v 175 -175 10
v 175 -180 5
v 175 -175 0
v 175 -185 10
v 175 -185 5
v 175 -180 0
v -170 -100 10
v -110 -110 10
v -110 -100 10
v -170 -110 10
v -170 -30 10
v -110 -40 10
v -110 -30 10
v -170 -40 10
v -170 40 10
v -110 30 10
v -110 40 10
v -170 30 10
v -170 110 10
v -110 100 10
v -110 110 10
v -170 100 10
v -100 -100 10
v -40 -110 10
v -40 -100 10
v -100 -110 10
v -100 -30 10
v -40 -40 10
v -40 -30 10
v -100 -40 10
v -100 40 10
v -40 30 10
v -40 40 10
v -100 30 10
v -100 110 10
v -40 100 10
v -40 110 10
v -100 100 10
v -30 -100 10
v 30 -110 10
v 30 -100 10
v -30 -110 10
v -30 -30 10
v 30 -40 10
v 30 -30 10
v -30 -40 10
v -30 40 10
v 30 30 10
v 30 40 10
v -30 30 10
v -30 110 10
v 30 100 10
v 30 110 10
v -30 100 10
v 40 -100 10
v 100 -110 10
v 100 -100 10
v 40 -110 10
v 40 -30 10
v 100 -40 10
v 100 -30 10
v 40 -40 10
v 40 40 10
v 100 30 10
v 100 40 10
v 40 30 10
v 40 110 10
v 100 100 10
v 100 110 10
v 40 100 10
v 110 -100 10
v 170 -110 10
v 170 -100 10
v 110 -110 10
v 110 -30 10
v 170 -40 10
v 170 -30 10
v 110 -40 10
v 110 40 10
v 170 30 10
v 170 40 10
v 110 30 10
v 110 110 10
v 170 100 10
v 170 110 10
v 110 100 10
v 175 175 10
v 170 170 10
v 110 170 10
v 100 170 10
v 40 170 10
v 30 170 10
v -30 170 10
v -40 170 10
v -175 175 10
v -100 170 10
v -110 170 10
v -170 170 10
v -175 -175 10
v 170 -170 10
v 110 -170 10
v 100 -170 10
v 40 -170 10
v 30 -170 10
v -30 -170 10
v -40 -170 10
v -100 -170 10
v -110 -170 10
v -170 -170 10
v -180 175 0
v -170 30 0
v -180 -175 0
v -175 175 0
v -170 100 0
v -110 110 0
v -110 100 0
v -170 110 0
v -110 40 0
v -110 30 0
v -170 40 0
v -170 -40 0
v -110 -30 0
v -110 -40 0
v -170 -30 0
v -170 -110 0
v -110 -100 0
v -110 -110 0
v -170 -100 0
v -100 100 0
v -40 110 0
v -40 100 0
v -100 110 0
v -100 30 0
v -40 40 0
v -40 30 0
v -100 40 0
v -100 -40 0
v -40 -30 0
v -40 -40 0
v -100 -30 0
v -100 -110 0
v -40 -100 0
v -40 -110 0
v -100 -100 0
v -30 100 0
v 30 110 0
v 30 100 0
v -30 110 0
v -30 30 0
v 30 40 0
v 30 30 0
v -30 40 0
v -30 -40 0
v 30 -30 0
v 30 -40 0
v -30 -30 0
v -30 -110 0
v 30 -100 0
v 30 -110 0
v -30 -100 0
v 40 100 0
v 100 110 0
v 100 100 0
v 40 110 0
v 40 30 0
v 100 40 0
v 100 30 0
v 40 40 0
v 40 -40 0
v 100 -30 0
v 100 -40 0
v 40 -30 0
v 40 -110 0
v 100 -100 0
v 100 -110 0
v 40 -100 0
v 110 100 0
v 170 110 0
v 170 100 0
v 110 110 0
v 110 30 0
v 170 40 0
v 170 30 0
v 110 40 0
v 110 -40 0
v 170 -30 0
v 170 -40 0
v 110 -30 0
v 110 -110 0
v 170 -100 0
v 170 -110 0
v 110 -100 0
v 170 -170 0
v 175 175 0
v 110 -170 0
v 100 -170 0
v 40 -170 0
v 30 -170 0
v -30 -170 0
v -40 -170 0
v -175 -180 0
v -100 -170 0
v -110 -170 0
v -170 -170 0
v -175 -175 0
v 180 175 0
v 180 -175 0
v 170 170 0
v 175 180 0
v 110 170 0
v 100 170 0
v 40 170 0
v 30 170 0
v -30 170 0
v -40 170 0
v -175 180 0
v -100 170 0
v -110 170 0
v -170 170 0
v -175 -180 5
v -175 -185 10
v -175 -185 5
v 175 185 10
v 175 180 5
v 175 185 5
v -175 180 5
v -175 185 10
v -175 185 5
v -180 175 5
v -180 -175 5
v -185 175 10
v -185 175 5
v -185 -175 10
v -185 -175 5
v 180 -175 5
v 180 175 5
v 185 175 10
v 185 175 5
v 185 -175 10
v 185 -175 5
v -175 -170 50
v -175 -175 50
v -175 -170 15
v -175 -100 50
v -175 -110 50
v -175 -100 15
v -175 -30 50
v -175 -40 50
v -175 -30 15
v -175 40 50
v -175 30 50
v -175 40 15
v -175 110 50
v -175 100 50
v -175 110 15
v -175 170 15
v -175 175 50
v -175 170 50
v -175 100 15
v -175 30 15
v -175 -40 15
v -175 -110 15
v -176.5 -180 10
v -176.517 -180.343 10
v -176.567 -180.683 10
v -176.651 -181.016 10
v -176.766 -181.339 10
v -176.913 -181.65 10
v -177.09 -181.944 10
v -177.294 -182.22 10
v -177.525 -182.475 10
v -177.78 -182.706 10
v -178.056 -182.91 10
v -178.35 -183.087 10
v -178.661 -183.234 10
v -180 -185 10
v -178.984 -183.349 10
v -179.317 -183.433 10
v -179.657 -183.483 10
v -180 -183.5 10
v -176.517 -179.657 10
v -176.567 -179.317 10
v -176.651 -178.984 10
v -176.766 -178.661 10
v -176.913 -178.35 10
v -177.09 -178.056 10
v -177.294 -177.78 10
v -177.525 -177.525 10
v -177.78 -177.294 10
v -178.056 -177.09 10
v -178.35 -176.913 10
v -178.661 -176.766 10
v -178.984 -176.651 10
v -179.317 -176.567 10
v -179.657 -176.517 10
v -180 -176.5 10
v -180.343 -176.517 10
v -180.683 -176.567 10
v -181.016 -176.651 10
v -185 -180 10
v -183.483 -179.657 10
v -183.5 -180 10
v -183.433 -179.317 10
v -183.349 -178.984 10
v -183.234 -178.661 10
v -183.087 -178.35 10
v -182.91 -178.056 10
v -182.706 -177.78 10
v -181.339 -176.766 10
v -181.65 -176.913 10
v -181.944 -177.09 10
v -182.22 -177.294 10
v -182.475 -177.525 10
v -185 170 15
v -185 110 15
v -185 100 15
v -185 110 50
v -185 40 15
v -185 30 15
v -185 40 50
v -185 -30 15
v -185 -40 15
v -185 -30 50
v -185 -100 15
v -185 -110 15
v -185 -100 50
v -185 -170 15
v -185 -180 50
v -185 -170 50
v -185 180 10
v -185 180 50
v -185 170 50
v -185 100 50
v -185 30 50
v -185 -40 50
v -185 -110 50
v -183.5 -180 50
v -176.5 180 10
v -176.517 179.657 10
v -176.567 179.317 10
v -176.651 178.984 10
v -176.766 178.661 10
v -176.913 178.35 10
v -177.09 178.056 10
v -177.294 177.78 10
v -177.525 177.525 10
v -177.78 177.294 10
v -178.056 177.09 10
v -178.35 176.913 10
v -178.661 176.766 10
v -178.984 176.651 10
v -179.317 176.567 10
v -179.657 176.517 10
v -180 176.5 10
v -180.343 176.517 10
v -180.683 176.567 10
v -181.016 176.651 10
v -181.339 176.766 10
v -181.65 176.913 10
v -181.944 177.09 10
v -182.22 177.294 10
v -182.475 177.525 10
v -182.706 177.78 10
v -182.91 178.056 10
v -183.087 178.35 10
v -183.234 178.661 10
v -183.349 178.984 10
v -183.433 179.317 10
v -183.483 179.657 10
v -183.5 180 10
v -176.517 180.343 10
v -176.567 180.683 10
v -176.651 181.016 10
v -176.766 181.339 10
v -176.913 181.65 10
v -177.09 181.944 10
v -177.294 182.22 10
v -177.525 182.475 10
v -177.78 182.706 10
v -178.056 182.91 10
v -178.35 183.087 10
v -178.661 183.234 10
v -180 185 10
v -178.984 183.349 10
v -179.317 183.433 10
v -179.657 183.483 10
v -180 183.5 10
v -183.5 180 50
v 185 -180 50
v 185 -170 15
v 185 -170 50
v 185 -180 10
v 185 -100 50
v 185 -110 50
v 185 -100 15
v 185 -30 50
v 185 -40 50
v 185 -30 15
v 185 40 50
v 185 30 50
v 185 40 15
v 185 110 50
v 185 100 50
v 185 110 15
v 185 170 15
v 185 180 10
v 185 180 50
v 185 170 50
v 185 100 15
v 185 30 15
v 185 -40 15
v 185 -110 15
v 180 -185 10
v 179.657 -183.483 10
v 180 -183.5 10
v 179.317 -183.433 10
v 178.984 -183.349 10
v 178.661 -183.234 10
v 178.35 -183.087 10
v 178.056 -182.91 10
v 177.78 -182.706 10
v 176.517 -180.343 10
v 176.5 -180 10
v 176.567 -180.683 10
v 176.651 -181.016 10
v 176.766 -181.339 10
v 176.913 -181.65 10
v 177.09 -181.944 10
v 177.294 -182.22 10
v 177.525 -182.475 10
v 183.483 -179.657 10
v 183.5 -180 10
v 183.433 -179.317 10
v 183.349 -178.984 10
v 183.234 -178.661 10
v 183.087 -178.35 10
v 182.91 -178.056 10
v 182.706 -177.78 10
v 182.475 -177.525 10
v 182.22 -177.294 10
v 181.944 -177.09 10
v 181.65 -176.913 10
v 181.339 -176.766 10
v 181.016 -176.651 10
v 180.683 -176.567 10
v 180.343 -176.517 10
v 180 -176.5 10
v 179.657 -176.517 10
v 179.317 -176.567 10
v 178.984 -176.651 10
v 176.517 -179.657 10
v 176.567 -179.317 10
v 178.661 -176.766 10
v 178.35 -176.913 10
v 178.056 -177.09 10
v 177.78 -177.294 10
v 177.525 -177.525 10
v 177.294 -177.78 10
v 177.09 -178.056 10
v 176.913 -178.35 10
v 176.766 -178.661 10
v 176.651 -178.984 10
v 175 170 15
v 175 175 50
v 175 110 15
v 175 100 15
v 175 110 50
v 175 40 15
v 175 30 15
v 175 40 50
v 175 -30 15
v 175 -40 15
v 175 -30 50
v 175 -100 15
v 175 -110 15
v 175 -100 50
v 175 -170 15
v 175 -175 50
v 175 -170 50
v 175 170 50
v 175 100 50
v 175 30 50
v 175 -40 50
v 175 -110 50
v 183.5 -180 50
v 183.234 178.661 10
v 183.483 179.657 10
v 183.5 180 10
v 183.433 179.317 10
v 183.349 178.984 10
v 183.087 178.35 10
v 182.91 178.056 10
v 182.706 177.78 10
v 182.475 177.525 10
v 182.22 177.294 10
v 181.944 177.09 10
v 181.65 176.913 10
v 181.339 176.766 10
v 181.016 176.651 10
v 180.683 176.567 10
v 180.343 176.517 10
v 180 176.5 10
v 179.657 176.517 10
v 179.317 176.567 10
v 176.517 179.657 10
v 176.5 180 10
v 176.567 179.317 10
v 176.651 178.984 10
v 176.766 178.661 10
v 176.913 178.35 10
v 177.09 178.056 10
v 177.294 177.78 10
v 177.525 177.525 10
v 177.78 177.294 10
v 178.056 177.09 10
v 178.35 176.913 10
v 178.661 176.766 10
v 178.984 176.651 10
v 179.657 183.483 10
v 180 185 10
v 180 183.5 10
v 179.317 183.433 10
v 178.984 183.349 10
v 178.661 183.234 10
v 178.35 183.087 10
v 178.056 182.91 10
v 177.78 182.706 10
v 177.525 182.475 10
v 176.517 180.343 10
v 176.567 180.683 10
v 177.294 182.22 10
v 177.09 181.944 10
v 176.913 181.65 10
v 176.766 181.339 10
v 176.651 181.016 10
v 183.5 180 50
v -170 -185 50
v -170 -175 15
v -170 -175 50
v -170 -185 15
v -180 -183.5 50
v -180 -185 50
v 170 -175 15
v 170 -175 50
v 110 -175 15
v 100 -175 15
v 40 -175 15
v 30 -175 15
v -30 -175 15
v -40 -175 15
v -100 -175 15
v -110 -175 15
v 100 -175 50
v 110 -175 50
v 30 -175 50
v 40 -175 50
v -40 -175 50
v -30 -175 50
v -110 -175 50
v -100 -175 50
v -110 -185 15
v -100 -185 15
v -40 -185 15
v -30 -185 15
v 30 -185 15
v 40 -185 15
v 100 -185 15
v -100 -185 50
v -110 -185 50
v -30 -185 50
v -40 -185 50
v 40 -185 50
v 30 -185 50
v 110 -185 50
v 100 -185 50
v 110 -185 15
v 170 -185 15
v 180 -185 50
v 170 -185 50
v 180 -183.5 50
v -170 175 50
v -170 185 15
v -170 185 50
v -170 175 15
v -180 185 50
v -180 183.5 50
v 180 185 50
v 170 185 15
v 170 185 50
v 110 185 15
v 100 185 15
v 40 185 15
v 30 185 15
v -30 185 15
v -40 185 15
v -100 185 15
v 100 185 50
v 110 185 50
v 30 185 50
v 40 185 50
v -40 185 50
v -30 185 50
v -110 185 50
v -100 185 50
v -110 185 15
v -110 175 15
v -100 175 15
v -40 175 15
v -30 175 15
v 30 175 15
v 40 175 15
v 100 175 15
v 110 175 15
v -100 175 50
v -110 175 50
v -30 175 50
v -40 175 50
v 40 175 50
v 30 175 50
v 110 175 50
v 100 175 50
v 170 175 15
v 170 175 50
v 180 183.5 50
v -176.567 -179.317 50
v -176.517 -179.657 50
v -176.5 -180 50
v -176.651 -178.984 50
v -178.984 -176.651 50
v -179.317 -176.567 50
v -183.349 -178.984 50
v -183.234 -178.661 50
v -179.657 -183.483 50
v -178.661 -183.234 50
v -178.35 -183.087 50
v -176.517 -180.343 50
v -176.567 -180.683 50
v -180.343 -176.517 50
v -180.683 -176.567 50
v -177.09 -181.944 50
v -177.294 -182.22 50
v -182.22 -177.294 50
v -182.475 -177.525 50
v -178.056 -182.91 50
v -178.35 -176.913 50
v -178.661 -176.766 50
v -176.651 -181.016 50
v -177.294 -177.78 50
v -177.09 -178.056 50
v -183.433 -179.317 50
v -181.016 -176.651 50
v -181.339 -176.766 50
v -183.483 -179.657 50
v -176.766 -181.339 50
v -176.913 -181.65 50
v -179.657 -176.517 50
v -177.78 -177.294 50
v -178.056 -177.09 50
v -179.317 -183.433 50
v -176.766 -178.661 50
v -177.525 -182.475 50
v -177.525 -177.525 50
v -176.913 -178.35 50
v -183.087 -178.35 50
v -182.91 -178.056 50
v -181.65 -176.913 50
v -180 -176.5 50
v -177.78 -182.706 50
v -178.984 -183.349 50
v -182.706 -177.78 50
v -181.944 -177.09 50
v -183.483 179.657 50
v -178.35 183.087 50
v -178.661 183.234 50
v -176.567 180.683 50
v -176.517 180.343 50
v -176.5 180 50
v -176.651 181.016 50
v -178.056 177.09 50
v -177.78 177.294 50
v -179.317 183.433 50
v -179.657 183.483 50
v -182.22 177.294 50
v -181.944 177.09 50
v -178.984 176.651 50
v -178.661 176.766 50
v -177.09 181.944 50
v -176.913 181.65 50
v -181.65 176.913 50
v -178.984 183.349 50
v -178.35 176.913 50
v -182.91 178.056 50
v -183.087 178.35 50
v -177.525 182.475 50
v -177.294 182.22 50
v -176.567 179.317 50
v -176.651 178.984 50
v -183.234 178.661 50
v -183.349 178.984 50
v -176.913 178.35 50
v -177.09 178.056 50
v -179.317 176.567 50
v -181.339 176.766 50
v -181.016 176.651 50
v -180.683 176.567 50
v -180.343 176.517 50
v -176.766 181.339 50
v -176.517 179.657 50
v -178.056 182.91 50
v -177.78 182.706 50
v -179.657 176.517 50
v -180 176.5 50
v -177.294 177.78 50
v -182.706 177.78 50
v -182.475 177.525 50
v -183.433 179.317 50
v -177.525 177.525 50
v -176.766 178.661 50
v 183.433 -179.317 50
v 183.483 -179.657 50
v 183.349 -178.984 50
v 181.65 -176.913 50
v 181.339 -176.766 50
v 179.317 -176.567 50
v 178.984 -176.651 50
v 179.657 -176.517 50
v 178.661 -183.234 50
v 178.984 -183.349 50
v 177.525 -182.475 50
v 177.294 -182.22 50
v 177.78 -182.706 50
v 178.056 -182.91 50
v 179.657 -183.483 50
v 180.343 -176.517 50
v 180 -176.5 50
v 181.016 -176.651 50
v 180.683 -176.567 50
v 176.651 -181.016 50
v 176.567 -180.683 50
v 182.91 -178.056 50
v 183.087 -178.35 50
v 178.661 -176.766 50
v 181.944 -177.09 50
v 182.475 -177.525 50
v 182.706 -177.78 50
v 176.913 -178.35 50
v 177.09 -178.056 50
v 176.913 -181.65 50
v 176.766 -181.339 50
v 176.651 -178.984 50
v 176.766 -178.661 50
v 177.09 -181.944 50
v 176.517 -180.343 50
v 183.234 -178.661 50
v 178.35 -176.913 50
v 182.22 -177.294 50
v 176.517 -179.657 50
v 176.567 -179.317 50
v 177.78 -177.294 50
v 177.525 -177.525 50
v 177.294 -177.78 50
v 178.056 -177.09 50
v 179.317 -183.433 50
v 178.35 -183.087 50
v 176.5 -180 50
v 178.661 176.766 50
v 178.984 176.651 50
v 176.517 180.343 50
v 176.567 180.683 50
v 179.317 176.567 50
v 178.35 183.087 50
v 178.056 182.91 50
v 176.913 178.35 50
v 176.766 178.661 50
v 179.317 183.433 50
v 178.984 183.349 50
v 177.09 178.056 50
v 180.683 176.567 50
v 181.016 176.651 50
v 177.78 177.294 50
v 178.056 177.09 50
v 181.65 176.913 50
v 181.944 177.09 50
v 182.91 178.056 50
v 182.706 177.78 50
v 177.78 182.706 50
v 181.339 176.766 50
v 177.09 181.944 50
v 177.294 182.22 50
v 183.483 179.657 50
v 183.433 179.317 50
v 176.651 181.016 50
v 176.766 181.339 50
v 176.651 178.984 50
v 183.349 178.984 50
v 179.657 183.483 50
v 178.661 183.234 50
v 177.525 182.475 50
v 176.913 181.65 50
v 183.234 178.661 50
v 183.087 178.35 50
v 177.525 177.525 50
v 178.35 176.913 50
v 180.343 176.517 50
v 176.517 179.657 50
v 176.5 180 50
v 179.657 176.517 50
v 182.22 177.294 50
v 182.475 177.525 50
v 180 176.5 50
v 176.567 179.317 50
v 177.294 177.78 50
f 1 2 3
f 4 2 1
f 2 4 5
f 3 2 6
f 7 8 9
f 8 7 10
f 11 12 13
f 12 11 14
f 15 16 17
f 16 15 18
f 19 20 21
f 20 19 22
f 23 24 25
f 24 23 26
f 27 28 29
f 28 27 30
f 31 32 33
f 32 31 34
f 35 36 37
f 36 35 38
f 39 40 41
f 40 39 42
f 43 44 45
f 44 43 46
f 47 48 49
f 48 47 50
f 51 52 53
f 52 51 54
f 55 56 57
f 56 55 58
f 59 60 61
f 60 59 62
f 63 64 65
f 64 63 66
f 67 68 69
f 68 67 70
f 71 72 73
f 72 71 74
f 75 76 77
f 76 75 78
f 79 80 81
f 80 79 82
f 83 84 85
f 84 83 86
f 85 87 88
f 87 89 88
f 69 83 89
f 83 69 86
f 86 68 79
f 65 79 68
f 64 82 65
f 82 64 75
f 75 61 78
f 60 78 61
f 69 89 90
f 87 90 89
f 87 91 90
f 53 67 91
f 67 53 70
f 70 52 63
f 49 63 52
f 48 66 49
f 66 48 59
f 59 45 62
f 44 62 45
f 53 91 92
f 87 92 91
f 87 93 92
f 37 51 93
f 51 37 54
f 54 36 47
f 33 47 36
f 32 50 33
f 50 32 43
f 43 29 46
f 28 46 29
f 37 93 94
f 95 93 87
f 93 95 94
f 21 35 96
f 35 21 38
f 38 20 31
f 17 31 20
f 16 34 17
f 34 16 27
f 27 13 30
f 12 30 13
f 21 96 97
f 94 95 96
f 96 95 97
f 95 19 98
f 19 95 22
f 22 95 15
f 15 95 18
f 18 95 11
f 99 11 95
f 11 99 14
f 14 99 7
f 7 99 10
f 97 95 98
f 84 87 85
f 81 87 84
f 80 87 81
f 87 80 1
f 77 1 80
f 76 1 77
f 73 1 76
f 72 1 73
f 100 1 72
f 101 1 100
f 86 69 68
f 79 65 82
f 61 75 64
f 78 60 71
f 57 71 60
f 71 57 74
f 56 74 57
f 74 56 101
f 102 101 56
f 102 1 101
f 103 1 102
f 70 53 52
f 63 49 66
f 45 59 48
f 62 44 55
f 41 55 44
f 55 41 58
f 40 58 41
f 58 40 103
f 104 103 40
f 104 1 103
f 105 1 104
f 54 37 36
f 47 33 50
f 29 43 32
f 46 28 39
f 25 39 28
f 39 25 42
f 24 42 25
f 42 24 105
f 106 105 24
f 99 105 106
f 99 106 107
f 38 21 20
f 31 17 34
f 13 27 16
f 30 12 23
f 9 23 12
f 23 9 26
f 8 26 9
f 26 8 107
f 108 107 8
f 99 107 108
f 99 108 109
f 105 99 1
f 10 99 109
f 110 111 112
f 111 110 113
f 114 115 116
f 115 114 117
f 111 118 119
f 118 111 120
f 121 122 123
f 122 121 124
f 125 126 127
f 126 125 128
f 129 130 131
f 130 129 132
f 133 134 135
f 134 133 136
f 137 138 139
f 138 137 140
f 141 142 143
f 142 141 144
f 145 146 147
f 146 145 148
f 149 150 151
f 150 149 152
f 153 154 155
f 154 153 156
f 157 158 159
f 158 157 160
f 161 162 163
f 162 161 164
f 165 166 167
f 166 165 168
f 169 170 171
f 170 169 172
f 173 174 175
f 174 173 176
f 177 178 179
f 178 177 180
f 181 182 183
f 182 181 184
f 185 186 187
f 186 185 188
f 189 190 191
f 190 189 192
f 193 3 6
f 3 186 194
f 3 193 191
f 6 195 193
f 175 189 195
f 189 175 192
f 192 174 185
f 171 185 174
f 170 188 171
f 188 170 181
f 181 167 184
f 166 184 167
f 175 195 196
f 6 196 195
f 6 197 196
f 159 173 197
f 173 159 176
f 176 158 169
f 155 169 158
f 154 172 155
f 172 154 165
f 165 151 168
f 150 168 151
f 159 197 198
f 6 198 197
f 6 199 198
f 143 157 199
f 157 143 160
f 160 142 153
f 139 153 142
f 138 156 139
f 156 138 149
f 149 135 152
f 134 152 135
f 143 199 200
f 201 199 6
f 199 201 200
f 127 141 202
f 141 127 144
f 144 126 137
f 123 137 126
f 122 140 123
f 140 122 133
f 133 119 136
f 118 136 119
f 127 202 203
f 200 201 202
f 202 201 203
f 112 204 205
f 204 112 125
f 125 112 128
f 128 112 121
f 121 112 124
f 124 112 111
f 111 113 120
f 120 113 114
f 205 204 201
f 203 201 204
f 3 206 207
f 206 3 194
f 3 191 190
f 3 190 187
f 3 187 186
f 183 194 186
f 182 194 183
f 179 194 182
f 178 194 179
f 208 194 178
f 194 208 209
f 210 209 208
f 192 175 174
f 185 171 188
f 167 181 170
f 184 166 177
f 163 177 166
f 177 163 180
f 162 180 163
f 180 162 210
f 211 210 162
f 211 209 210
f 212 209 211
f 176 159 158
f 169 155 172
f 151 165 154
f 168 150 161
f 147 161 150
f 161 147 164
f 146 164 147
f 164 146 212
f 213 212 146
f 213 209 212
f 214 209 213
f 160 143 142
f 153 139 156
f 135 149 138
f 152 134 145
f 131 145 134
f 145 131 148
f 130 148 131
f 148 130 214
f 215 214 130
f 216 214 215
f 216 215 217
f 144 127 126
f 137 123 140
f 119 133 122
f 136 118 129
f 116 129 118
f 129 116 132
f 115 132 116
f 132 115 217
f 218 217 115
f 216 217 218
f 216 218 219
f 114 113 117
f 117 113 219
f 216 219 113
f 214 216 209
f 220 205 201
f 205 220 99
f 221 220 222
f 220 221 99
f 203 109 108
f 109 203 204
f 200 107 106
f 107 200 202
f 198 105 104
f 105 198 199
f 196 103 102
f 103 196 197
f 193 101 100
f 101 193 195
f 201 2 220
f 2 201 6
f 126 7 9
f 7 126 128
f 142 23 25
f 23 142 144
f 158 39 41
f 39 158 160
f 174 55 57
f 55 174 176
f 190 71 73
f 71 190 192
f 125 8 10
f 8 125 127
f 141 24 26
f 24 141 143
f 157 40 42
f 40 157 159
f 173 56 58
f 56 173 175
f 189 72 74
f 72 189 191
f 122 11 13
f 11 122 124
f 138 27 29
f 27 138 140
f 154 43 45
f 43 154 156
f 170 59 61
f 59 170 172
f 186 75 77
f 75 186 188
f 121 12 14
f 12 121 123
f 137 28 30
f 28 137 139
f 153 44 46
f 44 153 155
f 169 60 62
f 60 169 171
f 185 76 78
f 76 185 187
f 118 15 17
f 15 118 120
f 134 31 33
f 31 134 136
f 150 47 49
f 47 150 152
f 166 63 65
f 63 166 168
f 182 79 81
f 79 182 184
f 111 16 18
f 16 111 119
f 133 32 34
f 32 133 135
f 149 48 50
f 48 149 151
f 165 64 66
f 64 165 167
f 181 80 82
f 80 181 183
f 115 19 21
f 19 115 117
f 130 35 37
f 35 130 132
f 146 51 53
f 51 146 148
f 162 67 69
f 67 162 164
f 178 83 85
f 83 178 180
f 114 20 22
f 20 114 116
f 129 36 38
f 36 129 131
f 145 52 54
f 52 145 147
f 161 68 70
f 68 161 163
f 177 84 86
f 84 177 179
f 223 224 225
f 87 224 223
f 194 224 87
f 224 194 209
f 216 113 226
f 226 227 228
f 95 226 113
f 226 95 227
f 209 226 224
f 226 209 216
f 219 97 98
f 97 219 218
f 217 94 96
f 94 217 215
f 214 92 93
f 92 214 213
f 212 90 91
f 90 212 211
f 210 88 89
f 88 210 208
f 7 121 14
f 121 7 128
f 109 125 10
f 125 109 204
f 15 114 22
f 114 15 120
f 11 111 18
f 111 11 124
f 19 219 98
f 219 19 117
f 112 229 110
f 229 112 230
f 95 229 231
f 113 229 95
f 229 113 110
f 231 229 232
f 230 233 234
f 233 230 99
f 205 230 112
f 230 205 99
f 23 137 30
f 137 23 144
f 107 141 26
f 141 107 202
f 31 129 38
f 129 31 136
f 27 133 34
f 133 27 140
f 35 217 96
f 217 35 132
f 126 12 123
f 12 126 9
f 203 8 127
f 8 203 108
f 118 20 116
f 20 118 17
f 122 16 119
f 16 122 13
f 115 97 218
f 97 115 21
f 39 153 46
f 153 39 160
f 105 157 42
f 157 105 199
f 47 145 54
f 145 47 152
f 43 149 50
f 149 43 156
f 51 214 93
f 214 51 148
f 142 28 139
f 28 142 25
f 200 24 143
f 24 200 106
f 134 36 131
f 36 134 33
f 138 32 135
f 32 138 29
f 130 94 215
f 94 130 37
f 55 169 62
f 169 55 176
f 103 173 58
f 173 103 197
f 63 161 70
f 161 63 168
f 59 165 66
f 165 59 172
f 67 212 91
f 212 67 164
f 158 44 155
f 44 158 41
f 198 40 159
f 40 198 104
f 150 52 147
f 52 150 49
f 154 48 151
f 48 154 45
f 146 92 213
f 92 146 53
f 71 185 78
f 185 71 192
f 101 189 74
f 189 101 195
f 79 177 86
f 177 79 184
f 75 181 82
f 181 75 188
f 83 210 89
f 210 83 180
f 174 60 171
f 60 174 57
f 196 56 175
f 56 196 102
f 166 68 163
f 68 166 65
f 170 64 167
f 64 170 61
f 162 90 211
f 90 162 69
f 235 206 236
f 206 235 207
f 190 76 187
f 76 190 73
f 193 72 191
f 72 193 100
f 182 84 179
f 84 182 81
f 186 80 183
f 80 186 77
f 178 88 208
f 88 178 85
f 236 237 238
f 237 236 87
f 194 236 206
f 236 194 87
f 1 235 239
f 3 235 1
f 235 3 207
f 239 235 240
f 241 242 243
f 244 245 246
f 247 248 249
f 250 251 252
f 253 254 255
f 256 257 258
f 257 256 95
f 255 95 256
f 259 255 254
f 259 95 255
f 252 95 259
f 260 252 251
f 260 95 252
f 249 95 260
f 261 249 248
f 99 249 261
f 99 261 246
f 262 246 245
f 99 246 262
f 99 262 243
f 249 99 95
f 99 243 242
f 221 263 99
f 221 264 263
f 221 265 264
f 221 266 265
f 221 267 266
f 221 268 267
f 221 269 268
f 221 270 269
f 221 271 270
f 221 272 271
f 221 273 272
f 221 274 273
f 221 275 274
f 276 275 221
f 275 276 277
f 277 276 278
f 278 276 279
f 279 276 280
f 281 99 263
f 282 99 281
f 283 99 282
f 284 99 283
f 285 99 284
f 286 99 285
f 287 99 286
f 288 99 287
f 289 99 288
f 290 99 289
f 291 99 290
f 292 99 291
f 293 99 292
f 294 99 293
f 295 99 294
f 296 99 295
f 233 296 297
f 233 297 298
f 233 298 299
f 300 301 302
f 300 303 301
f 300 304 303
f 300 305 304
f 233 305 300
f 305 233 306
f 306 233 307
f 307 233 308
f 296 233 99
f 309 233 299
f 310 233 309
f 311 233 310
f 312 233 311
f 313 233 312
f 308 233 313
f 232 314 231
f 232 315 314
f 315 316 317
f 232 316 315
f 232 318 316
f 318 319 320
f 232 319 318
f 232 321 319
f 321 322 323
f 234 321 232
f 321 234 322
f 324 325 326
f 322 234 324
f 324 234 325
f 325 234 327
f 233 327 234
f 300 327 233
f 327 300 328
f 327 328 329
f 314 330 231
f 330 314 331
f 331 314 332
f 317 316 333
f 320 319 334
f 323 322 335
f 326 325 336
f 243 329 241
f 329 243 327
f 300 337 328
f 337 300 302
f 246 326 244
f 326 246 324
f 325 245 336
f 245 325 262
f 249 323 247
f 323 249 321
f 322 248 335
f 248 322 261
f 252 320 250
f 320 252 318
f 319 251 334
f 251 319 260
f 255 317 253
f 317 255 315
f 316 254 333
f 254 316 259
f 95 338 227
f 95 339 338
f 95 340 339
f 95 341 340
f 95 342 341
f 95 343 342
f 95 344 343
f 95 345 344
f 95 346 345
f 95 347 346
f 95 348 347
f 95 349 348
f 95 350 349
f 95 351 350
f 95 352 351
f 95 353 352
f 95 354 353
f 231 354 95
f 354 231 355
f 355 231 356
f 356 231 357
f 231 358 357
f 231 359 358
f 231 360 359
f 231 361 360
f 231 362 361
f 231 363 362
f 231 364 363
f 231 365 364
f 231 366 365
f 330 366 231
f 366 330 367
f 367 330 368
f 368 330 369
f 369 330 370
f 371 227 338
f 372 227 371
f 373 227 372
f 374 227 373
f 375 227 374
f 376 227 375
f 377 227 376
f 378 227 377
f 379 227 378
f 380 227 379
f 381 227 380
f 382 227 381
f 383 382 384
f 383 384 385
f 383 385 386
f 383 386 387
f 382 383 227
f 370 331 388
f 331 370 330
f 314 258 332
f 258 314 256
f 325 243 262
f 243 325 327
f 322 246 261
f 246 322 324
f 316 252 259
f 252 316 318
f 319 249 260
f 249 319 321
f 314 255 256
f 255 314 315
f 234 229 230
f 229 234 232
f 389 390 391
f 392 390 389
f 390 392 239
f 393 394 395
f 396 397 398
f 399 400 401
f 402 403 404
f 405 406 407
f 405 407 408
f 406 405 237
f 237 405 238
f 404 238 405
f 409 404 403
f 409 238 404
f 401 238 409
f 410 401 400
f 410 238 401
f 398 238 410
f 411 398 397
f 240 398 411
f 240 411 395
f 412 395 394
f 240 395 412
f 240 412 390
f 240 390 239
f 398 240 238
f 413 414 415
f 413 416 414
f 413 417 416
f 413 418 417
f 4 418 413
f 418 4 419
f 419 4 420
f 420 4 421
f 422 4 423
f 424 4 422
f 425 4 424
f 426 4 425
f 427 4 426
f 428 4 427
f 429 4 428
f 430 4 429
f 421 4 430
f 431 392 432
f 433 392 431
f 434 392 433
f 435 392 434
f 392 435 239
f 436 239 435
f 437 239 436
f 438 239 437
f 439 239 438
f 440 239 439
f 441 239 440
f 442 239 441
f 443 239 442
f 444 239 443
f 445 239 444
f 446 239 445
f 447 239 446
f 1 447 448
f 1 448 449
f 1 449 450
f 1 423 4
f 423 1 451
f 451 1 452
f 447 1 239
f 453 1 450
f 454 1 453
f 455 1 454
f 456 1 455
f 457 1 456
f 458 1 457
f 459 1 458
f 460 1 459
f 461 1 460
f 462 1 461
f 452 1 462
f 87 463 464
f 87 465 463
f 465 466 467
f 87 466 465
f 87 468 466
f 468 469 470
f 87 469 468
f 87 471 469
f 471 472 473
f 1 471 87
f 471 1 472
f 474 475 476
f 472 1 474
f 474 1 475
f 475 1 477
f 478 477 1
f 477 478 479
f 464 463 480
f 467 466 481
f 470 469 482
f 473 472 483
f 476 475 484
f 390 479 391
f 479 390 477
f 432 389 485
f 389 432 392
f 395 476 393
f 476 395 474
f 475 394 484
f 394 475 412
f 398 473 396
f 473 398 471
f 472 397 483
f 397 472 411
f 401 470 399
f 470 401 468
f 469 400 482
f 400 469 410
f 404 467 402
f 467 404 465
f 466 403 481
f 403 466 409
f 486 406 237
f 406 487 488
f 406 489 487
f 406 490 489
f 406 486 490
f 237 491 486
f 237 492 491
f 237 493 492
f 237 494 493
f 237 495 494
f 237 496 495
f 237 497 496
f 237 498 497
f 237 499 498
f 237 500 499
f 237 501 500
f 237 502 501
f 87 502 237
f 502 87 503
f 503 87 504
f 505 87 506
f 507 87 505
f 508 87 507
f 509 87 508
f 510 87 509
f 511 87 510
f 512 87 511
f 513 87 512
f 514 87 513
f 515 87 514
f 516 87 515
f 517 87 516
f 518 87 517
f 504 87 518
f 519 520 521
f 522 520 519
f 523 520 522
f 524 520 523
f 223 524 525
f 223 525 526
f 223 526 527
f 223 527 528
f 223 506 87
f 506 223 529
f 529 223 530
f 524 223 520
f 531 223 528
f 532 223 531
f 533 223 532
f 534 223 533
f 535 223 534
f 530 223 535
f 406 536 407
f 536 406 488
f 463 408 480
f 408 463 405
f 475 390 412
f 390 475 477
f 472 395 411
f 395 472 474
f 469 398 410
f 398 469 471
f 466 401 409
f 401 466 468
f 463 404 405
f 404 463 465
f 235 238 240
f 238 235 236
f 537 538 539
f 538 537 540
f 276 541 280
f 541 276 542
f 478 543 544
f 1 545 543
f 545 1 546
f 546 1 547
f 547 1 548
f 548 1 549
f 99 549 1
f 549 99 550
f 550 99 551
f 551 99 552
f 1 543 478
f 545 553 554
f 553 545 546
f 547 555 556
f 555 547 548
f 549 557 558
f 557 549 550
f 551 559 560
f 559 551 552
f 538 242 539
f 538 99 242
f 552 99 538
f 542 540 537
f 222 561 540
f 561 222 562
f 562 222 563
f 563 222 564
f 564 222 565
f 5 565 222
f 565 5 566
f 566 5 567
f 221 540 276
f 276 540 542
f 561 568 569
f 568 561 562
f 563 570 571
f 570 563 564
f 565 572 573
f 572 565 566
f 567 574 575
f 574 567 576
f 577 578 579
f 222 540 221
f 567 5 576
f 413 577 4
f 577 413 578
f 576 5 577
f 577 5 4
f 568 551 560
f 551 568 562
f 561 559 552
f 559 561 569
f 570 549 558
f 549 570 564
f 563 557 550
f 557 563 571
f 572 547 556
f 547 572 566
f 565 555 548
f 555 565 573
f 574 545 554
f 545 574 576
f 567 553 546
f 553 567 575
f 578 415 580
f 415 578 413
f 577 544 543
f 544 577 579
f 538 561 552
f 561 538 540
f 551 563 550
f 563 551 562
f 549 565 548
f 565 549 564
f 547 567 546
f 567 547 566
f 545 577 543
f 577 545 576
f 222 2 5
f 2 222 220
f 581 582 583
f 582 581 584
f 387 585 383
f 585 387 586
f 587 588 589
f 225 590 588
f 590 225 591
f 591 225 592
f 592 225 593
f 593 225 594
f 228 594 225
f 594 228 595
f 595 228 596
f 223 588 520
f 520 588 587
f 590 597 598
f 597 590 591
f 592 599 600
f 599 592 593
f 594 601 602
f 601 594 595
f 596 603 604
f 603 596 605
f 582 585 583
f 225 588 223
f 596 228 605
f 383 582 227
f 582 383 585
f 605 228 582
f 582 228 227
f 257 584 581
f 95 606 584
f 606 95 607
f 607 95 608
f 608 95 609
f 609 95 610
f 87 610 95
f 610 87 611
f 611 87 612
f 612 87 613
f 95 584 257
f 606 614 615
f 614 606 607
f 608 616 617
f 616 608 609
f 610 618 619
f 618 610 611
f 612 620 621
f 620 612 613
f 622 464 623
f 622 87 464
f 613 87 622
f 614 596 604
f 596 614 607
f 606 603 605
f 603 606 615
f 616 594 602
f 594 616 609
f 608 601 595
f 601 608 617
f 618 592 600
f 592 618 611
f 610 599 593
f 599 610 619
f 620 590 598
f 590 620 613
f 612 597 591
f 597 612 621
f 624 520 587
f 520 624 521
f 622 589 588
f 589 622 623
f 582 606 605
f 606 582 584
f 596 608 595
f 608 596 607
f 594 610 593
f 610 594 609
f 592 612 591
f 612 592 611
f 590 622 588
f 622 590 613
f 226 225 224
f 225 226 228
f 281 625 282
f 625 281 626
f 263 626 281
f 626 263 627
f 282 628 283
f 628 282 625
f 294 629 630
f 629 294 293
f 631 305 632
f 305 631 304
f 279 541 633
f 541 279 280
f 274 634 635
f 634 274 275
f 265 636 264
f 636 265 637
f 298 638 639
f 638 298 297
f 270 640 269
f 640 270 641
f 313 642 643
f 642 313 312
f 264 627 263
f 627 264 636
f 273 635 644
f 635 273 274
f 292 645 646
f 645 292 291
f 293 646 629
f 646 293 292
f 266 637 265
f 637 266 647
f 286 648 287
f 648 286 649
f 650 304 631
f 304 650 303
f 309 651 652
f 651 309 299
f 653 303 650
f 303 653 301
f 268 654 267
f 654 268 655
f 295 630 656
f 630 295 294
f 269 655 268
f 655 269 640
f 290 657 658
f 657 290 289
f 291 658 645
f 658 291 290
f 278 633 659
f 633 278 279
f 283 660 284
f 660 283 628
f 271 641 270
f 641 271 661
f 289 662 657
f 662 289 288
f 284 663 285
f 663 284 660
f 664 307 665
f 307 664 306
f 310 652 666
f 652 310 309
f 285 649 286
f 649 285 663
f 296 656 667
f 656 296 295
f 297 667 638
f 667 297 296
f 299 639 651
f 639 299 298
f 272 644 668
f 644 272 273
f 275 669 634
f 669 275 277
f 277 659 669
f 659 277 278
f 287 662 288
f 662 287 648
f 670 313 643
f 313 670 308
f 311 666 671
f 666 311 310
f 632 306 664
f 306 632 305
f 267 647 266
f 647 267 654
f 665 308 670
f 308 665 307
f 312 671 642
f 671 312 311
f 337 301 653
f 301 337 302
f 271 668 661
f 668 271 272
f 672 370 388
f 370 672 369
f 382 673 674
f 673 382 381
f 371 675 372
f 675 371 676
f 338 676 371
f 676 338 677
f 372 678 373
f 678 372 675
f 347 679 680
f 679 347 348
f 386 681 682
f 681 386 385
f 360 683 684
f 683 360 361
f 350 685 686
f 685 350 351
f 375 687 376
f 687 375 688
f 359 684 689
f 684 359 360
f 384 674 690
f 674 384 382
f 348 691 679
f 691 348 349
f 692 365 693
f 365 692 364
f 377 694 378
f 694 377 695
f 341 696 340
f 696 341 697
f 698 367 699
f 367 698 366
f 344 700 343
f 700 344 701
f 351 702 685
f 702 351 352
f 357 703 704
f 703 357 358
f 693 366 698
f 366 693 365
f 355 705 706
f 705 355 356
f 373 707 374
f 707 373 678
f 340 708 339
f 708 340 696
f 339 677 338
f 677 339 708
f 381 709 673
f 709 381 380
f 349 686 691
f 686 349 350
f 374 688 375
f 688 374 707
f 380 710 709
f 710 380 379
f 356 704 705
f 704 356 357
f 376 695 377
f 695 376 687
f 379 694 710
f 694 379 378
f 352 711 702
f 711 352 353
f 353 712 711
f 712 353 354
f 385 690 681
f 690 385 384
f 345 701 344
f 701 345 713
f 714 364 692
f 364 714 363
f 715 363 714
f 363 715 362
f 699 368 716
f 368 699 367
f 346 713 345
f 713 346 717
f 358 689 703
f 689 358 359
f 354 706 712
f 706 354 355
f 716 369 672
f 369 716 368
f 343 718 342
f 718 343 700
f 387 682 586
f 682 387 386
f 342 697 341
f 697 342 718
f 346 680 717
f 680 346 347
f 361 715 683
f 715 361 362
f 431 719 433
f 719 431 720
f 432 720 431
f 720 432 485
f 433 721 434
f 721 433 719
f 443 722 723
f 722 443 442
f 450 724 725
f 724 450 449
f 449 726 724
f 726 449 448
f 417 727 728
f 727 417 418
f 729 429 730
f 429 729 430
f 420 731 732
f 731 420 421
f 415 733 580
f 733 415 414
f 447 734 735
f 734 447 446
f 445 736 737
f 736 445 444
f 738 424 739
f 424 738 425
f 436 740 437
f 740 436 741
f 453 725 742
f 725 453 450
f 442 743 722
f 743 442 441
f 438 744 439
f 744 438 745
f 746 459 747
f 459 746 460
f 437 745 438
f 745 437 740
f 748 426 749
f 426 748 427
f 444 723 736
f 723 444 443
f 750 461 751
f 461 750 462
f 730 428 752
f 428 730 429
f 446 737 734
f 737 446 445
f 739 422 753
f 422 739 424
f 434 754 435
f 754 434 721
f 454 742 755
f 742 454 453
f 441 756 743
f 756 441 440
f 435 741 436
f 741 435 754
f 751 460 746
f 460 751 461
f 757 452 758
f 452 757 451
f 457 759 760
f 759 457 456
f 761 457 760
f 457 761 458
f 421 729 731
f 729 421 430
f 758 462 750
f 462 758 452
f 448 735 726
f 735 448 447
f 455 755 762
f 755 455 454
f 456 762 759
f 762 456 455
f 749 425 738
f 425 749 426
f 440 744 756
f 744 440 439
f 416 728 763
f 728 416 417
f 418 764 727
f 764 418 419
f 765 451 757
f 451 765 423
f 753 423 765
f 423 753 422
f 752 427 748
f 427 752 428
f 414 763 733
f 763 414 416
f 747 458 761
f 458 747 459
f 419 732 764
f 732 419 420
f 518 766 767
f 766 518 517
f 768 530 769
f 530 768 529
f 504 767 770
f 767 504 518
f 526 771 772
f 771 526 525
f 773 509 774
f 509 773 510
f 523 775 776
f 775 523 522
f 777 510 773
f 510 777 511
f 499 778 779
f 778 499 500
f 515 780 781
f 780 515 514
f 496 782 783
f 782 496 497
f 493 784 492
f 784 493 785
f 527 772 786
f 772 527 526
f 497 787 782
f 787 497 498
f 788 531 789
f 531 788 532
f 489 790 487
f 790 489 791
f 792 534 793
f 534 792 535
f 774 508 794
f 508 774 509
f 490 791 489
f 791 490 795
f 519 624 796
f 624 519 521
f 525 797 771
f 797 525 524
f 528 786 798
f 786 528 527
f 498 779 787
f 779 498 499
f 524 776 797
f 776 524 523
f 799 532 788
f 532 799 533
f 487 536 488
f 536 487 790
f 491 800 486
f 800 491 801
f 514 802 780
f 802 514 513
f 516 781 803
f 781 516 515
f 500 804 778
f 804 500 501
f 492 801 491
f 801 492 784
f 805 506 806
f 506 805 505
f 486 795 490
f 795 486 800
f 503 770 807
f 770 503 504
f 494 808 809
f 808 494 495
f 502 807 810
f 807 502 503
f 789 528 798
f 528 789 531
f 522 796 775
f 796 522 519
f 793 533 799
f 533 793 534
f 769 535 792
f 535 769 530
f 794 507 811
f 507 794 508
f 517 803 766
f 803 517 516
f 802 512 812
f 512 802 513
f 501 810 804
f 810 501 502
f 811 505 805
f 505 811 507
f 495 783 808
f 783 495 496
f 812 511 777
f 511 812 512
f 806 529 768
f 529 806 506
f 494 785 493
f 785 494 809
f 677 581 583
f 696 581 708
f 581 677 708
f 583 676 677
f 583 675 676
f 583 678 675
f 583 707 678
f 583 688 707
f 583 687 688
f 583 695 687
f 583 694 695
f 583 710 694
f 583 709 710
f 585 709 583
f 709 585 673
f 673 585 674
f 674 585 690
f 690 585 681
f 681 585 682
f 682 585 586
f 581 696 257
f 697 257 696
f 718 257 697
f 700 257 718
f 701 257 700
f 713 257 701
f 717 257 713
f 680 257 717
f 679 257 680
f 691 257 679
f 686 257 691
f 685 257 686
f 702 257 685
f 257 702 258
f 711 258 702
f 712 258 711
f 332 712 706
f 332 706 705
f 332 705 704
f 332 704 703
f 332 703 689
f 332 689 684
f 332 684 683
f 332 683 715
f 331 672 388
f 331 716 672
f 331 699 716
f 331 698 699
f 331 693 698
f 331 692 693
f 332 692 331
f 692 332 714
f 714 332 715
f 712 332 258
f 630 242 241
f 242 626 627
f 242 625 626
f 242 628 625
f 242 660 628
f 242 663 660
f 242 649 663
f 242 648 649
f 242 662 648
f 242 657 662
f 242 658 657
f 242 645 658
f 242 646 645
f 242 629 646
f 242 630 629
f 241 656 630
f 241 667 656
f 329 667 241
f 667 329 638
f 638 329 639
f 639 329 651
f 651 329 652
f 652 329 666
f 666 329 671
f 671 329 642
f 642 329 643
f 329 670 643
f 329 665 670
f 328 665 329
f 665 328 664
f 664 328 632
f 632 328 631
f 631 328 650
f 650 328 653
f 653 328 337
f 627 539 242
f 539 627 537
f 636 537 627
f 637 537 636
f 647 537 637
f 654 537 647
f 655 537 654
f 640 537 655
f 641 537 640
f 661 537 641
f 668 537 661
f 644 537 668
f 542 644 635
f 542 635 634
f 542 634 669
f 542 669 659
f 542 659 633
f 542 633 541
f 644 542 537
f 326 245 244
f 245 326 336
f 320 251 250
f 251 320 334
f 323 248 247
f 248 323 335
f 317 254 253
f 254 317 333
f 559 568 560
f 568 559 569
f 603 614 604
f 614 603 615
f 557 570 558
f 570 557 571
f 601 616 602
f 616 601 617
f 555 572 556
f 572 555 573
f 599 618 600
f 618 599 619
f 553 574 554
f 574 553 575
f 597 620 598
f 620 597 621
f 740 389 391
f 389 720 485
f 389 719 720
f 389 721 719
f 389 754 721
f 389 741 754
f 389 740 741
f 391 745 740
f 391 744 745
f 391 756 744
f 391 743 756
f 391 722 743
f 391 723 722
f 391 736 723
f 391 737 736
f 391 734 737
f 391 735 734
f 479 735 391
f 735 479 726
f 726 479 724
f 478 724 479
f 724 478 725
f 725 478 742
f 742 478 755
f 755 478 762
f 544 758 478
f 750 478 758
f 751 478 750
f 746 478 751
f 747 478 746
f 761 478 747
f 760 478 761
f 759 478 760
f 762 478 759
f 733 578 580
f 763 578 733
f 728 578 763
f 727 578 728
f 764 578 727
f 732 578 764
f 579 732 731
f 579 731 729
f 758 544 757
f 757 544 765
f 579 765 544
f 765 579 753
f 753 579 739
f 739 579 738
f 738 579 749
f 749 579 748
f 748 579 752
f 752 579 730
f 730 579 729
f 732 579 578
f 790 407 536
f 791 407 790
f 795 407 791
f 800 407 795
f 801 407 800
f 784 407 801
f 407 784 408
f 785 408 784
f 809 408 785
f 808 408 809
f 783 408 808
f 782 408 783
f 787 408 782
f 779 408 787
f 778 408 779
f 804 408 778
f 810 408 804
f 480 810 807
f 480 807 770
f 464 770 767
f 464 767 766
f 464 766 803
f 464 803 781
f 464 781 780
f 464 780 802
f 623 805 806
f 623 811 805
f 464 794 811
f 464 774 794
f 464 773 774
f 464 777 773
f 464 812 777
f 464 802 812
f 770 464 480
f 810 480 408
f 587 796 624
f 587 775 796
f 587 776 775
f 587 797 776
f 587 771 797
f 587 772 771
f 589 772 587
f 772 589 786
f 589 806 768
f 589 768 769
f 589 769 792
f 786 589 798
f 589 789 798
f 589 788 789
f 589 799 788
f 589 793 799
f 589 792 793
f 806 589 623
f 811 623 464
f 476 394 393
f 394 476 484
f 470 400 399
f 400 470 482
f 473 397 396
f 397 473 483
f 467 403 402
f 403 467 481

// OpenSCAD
/*
  Cage slice 01 of 15
  Internal target size ≈350 x 350 x 700 mm.
  Bars: 10 x 10 mm. Clear gap between repeating bars ≈60 mm.
  This file generates the lowest slice (including the floor grid).
*/

bar = 10;
half_inner = 175;
gap = 70;        // center-to-center spacing -> 60 mm clear gap
rod_d = 7;       // clearance for M6 threaded rod
half_outer = half_inner + bar;

function grid_pos(n) = -half_inner + n * gap;

module cage_full() {
  difference() {
    union() {
      // Floor grid at z = -10 .. 0
      for (j = [0:5]) {
        y = grid_pos(j);
        translate([-half_inner, y - bar/2, -bar])
          cube([2*half_inner, bar, bar], center=false);
      }
      for (i = [0:5]) {
        x = grid_pos(i);
        translate([x - bar/2, -half_inner, -bar])
          cube([bar, 2*half_inner, bar], center=false);
      }

      // Roof grid at z = 700 .. 710
      for (j = [0:5]) {
        y = grid_pos(j);
        translate([-half_inner, y - bar/2, 700])
          cube([2*half_inner, bar, bar], center=false);
      }
      for (i = [0:5]) {
        x = grid_pos(i);
        translate([x - bar/2, -half_inner, 700])
          cube([bar, 2*half_inner, bar], center=false);
      }

      // Side walls at x = ±175
      for (side = [-1, 1]) {
        sx = side * half_inner;
        x0 = (side == 1) ? sx : sx - bar;  // +175 or -185
        // Vertical bars on side walls
        for (j = [0:5]) {
          y = grid_pos(j);
          translate([x0, y - bar/2, 0])
            cube([bar, bar, 700], center=false);
        }
        // Horizontal bars on side walls
        for (k = [0:10]) {
          zc = 0 + k * gap;
          translate([x0, -half_inner, zc - bar/2])
            cube([bar, 2*half_inner, bar], center=false);
        }
      }

      // Front/back walls at y = ±175
      for (side = [-1, 1]) {
        sy = side * half_inner;
        y0 = (side == 1) ? sy : sy - bar;  // +175 or -185
        // Vertical bars on front/back walls
        for (i = [0:5]) {
          x = grid_pos(i);
          translate([x - bar/2, y0, 0])
            cube([bar, bar, 700], center=false);
        }
        // Horizontal bars on front/back walls
        for (k = [0:10]) {
          zc = 0 + k * gap;
          translate([-half_inner, y0, zc - bar/2])
            cube([2*half_inner, bar, bar], center=false);
        }
      }
    }

    // M6 threaded rod clearance holes in the four corner vertical bars
    for (sx = [-1, 1], sy = [-1, 1]) {
      translate([sx * (half_inner + bar/2),
                 sy * (half_inner + bar/2),
                 -20])
        cylinder(d = rod_d, h = 740, $fn = 64);
    }
  }
}

// Slice Z range in the cage_full() coordinate system
z_min = -10;
z_max = 40;   // height 50 mm

module slice() {
  intersection() {
    cage_full();
    translate([-half_outer - 5, -half_outer - 5, z_min])
      cube([2*(half_outer + 5), 2*(half_outer + 5), z_max - z_min], center=false);
  }
}

// Shift so this slice sits on z=0 for printing
translate([0, 0, -z_min])
  slice();
